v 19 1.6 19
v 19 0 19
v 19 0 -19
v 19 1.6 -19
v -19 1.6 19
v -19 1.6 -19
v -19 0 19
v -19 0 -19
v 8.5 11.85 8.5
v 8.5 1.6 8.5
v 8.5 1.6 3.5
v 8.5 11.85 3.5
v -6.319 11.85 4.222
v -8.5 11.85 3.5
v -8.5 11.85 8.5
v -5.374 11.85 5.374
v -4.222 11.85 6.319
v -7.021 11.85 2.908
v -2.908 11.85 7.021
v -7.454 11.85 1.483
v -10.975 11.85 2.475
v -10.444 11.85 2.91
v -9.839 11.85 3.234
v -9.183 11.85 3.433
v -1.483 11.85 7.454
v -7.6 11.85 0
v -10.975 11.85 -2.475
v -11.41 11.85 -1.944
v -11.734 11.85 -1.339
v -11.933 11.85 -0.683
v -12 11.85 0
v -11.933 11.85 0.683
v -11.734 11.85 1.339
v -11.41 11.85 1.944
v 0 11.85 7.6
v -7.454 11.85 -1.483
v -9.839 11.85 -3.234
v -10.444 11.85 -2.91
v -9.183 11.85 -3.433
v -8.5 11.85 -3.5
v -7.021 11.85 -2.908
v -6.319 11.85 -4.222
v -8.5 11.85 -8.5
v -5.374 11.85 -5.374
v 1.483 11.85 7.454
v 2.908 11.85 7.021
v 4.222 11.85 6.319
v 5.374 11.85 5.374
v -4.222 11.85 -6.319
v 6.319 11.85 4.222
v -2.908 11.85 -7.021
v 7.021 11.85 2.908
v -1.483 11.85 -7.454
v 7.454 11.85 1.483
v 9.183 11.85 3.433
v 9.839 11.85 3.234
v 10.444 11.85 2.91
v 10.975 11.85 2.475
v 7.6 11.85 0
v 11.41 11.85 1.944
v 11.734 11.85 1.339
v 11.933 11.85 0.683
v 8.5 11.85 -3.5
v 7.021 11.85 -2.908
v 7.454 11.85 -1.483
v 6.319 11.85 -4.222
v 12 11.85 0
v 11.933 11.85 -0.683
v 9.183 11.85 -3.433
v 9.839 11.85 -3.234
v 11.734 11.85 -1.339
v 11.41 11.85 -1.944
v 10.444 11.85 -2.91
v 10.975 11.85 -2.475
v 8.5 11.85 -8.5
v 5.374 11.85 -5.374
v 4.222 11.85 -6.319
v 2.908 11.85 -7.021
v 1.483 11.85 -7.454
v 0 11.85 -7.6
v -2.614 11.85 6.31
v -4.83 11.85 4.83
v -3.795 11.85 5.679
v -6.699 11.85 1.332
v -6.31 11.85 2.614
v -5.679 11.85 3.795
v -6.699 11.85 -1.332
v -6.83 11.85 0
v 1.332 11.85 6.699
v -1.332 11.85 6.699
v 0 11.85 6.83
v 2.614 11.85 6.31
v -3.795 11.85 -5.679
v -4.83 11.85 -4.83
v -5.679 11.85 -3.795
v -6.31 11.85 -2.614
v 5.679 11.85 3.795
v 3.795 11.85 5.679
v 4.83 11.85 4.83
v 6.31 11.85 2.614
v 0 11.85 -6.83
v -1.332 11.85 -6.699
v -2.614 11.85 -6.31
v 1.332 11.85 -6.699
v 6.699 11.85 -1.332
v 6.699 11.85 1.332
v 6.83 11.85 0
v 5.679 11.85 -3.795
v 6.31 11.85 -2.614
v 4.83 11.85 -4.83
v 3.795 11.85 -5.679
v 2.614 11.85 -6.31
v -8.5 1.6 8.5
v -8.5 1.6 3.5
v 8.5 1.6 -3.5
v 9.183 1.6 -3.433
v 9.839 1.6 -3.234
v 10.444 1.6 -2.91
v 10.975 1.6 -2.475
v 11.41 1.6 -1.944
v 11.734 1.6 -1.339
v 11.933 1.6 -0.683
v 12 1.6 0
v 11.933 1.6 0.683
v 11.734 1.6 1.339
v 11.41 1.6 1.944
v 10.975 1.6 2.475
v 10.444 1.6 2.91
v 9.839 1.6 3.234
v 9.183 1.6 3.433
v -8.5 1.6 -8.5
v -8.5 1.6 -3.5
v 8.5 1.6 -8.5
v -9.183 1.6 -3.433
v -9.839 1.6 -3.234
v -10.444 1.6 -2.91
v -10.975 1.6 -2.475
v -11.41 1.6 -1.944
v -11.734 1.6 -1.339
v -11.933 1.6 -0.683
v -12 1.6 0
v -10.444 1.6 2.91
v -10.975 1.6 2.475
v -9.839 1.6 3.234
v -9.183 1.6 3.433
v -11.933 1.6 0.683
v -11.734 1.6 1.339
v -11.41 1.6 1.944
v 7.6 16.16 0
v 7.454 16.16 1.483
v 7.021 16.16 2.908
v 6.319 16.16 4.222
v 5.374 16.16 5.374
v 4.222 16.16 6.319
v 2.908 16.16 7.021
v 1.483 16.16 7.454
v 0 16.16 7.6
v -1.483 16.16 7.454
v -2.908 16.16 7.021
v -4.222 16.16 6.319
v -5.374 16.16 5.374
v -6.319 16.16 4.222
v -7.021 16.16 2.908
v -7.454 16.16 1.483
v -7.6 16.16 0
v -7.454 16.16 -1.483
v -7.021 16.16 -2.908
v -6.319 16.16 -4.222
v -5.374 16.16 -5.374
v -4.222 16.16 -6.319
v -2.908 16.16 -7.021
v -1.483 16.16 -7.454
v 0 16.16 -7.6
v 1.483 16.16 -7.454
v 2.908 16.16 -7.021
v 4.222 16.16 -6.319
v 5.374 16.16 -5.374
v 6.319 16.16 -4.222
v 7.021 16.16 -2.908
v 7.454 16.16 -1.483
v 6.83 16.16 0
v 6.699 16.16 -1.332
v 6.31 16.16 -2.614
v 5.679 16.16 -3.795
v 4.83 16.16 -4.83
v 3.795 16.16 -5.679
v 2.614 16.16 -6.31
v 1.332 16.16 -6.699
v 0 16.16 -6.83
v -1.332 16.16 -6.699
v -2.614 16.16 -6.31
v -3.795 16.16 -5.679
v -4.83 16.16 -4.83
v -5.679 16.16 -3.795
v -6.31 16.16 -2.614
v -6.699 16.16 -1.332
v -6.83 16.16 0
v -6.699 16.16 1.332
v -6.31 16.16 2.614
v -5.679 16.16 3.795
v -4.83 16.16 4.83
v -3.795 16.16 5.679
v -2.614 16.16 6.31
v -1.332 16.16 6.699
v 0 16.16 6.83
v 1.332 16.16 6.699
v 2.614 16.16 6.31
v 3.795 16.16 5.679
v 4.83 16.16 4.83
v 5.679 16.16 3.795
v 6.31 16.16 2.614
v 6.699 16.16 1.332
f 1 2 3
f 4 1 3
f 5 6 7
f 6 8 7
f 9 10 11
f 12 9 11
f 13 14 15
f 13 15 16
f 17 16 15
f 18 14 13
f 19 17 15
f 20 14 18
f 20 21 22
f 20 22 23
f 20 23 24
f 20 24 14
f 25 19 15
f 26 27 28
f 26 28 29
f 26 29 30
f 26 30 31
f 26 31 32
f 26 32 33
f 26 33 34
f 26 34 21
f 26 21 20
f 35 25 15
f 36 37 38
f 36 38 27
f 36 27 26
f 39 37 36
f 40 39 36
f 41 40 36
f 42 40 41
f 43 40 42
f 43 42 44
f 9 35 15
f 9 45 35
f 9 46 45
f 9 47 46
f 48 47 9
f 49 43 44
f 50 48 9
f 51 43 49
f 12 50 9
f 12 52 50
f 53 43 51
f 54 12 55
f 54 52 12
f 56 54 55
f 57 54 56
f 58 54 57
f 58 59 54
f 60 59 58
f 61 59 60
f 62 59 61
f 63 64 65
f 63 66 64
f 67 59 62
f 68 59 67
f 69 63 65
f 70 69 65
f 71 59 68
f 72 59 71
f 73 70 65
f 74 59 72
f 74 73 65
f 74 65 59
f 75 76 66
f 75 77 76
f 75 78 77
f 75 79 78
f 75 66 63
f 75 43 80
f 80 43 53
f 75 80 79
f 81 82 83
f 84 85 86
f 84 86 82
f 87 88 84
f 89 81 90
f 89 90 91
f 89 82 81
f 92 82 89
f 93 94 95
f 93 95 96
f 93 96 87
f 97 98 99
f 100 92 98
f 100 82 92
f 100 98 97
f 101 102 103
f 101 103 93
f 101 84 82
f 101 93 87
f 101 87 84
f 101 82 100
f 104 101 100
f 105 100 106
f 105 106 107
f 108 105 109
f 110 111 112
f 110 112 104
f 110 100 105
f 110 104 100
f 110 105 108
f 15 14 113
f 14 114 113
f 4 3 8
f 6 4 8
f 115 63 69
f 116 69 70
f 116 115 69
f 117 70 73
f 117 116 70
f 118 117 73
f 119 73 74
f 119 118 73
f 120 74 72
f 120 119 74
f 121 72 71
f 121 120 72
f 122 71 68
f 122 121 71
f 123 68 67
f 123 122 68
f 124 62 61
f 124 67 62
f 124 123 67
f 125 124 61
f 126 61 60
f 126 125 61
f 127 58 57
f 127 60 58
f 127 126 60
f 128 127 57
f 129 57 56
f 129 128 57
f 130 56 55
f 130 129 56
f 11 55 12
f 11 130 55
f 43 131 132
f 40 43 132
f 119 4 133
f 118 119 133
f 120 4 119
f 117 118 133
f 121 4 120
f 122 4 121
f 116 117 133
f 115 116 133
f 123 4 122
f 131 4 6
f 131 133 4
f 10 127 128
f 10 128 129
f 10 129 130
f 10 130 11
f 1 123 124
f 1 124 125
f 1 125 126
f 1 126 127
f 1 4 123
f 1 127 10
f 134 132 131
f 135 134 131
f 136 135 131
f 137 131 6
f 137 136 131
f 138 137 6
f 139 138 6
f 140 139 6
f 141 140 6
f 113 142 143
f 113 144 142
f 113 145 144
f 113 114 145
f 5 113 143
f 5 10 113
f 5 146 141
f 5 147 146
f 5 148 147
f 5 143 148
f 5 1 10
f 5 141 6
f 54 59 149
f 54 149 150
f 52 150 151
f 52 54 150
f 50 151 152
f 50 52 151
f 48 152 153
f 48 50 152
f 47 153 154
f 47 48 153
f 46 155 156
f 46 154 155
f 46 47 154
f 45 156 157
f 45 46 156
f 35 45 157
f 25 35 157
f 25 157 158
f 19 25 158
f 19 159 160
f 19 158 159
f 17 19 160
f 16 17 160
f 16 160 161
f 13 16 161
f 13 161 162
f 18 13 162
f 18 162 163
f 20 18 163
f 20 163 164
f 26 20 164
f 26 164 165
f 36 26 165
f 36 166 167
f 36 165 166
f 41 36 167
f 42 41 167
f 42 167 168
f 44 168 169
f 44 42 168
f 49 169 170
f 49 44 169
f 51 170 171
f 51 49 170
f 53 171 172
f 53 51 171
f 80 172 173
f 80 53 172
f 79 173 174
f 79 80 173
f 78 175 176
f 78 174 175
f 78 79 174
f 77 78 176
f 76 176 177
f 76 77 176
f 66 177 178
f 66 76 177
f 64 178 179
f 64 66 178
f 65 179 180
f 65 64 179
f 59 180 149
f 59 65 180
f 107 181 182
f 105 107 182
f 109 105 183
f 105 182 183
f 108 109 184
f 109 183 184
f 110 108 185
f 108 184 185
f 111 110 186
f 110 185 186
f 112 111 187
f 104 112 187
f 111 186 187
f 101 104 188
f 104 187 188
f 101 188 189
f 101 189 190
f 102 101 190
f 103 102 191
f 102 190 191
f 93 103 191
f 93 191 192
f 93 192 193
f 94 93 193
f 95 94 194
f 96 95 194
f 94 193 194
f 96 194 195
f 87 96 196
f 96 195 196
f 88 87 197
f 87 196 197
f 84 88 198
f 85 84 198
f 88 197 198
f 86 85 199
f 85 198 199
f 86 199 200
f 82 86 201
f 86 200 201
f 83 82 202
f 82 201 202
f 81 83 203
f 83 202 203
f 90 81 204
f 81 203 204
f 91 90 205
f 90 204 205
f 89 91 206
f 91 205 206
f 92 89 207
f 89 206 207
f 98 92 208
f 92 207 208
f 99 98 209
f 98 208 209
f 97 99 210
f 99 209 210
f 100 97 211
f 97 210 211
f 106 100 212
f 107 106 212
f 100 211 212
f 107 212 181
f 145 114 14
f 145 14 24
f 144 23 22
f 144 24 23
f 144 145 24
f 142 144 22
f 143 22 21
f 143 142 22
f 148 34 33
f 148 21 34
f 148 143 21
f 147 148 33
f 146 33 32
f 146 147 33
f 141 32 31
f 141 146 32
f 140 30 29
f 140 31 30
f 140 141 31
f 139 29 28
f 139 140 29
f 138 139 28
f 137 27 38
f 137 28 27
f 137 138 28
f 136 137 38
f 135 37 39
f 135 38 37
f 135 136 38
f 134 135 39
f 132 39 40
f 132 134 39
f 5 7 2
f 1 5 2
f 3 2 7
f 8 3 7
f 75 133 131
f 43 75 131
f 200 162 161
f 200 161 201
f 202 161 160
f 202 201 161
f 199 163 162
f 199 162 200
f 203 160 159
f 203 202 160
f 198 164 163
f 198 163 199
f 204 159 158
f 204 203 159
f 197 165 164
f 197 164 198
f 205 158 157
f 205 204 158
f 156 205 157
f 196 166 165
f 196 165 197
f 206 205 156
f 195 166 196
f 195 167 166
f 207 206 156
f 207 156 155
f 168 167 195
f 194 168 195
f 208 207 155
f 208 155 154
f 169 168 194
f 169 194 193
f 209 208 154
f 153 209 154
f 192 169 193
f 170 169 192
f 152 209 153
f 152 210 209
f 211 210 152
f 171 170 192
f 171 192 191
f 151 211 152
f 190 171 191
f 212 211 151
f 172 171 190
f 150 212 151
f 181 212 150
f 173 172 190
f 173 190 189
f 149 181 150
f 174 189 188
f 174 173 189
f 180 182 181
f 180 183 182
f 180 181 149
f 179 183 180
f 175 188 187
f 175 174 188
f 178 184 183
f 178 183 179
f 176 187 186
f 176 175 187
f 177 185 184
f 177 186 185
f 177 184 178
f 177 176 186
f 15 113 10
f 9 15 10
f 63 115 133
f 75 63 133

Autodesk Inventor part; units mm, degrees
ref_plane "YZ Plane" through (0, 0, 0) normal (1, 0, 0) x (0, 1, 0)
ref_plane "XZ Plane" through (0, 0, 0) normal (0, 1, 0) x (-1, 0, 0)
ref_plane "XY Plane" through (0, 0, 0) normal (0, 0, 1) x (1, 0, 0)
sketch "Sketch1" plane through (0, 0, 0) normal (0, 1, 0) x (-1, 0, 0)
  line L0 (19, 19) -> (-19, 19)
  line L1 (-19, 19) -> (-19, -19)
  line L2 (-19, -19) -> (19, -19)
  line L3 (19, -19) -> (19, 19)
  line L4 (19, 19) -> (-19, -19) construction
  line L5 (-19, 19) -> (19, -19) construction
  point P0 (0, 0)
  dimension "d0" = 38
  dimension "d1" = 38
extrude "Extrusion1" add sketch "Sketch1" along normal blind 1.6
sketch "Sketch2" plane through (0, 1.6, 0) normal (0, 1, 0) x (1, 0, 0)
  line L0 (-8.5, -8.5) -> (8.5, -8.5)
  line L1 (8.5, -8.5) -> (8.5, 8.5)
  line L2 (8.5, 8.5) -> (-8.5, 8.5)
  line L3 (-8.5, 8.5) -> (-8.5, -8.5)
  line L4 (-8.5, -8.5) -> (8.5, 8.5) construction
  line L5 (8.5, -8.5) -> (-8.5, 8.5) construction
  circle A0 centre (-8.5, 0) radius 3.5
  circle A1 centre (8.5, 0) radius 3.5
  point P0 (0, 0)
  point P1 (8.5, -3.5)
  point P2 (8.5, 3.5)
  point P3 (-8.5, 3.5)
  point P4 (-8.5, -3.5)
  dimension "d4" = 17
  dimension "d5" = 17
  dimension "d6" = 7
  dimension "d7" = 7
extrude "Extrusion2" add sketch "Sketch2" along normal blind 10.25
sketch "Sketch3" plane through (0, 11.85, 0) normal (0, 1, 0) x (1, 0, 0)
  circle A0 centre (0, 0) radius 7.6
  dimension "d10" = 15.2
extrude "Extrusion3" add sketch "Sketch3" along normal blind 4.31
sketch "Sketch4" plane through (0, 16.16, 0) normal (0, 1, 0) x (1, 0, 0)
  circle A0 centre (0, 0) radius 6.83
  dimension "d13" = 13.66
extrude "Extrusion4" cut sketch "Sketch4" against normal blind 4.31
sketch "Sketch5" plane through (0, 11.85, 0) normal (0, 1, 0) x (1, 0, 0)
  point P0 (0, 0)
properties part number "Camera Top"
